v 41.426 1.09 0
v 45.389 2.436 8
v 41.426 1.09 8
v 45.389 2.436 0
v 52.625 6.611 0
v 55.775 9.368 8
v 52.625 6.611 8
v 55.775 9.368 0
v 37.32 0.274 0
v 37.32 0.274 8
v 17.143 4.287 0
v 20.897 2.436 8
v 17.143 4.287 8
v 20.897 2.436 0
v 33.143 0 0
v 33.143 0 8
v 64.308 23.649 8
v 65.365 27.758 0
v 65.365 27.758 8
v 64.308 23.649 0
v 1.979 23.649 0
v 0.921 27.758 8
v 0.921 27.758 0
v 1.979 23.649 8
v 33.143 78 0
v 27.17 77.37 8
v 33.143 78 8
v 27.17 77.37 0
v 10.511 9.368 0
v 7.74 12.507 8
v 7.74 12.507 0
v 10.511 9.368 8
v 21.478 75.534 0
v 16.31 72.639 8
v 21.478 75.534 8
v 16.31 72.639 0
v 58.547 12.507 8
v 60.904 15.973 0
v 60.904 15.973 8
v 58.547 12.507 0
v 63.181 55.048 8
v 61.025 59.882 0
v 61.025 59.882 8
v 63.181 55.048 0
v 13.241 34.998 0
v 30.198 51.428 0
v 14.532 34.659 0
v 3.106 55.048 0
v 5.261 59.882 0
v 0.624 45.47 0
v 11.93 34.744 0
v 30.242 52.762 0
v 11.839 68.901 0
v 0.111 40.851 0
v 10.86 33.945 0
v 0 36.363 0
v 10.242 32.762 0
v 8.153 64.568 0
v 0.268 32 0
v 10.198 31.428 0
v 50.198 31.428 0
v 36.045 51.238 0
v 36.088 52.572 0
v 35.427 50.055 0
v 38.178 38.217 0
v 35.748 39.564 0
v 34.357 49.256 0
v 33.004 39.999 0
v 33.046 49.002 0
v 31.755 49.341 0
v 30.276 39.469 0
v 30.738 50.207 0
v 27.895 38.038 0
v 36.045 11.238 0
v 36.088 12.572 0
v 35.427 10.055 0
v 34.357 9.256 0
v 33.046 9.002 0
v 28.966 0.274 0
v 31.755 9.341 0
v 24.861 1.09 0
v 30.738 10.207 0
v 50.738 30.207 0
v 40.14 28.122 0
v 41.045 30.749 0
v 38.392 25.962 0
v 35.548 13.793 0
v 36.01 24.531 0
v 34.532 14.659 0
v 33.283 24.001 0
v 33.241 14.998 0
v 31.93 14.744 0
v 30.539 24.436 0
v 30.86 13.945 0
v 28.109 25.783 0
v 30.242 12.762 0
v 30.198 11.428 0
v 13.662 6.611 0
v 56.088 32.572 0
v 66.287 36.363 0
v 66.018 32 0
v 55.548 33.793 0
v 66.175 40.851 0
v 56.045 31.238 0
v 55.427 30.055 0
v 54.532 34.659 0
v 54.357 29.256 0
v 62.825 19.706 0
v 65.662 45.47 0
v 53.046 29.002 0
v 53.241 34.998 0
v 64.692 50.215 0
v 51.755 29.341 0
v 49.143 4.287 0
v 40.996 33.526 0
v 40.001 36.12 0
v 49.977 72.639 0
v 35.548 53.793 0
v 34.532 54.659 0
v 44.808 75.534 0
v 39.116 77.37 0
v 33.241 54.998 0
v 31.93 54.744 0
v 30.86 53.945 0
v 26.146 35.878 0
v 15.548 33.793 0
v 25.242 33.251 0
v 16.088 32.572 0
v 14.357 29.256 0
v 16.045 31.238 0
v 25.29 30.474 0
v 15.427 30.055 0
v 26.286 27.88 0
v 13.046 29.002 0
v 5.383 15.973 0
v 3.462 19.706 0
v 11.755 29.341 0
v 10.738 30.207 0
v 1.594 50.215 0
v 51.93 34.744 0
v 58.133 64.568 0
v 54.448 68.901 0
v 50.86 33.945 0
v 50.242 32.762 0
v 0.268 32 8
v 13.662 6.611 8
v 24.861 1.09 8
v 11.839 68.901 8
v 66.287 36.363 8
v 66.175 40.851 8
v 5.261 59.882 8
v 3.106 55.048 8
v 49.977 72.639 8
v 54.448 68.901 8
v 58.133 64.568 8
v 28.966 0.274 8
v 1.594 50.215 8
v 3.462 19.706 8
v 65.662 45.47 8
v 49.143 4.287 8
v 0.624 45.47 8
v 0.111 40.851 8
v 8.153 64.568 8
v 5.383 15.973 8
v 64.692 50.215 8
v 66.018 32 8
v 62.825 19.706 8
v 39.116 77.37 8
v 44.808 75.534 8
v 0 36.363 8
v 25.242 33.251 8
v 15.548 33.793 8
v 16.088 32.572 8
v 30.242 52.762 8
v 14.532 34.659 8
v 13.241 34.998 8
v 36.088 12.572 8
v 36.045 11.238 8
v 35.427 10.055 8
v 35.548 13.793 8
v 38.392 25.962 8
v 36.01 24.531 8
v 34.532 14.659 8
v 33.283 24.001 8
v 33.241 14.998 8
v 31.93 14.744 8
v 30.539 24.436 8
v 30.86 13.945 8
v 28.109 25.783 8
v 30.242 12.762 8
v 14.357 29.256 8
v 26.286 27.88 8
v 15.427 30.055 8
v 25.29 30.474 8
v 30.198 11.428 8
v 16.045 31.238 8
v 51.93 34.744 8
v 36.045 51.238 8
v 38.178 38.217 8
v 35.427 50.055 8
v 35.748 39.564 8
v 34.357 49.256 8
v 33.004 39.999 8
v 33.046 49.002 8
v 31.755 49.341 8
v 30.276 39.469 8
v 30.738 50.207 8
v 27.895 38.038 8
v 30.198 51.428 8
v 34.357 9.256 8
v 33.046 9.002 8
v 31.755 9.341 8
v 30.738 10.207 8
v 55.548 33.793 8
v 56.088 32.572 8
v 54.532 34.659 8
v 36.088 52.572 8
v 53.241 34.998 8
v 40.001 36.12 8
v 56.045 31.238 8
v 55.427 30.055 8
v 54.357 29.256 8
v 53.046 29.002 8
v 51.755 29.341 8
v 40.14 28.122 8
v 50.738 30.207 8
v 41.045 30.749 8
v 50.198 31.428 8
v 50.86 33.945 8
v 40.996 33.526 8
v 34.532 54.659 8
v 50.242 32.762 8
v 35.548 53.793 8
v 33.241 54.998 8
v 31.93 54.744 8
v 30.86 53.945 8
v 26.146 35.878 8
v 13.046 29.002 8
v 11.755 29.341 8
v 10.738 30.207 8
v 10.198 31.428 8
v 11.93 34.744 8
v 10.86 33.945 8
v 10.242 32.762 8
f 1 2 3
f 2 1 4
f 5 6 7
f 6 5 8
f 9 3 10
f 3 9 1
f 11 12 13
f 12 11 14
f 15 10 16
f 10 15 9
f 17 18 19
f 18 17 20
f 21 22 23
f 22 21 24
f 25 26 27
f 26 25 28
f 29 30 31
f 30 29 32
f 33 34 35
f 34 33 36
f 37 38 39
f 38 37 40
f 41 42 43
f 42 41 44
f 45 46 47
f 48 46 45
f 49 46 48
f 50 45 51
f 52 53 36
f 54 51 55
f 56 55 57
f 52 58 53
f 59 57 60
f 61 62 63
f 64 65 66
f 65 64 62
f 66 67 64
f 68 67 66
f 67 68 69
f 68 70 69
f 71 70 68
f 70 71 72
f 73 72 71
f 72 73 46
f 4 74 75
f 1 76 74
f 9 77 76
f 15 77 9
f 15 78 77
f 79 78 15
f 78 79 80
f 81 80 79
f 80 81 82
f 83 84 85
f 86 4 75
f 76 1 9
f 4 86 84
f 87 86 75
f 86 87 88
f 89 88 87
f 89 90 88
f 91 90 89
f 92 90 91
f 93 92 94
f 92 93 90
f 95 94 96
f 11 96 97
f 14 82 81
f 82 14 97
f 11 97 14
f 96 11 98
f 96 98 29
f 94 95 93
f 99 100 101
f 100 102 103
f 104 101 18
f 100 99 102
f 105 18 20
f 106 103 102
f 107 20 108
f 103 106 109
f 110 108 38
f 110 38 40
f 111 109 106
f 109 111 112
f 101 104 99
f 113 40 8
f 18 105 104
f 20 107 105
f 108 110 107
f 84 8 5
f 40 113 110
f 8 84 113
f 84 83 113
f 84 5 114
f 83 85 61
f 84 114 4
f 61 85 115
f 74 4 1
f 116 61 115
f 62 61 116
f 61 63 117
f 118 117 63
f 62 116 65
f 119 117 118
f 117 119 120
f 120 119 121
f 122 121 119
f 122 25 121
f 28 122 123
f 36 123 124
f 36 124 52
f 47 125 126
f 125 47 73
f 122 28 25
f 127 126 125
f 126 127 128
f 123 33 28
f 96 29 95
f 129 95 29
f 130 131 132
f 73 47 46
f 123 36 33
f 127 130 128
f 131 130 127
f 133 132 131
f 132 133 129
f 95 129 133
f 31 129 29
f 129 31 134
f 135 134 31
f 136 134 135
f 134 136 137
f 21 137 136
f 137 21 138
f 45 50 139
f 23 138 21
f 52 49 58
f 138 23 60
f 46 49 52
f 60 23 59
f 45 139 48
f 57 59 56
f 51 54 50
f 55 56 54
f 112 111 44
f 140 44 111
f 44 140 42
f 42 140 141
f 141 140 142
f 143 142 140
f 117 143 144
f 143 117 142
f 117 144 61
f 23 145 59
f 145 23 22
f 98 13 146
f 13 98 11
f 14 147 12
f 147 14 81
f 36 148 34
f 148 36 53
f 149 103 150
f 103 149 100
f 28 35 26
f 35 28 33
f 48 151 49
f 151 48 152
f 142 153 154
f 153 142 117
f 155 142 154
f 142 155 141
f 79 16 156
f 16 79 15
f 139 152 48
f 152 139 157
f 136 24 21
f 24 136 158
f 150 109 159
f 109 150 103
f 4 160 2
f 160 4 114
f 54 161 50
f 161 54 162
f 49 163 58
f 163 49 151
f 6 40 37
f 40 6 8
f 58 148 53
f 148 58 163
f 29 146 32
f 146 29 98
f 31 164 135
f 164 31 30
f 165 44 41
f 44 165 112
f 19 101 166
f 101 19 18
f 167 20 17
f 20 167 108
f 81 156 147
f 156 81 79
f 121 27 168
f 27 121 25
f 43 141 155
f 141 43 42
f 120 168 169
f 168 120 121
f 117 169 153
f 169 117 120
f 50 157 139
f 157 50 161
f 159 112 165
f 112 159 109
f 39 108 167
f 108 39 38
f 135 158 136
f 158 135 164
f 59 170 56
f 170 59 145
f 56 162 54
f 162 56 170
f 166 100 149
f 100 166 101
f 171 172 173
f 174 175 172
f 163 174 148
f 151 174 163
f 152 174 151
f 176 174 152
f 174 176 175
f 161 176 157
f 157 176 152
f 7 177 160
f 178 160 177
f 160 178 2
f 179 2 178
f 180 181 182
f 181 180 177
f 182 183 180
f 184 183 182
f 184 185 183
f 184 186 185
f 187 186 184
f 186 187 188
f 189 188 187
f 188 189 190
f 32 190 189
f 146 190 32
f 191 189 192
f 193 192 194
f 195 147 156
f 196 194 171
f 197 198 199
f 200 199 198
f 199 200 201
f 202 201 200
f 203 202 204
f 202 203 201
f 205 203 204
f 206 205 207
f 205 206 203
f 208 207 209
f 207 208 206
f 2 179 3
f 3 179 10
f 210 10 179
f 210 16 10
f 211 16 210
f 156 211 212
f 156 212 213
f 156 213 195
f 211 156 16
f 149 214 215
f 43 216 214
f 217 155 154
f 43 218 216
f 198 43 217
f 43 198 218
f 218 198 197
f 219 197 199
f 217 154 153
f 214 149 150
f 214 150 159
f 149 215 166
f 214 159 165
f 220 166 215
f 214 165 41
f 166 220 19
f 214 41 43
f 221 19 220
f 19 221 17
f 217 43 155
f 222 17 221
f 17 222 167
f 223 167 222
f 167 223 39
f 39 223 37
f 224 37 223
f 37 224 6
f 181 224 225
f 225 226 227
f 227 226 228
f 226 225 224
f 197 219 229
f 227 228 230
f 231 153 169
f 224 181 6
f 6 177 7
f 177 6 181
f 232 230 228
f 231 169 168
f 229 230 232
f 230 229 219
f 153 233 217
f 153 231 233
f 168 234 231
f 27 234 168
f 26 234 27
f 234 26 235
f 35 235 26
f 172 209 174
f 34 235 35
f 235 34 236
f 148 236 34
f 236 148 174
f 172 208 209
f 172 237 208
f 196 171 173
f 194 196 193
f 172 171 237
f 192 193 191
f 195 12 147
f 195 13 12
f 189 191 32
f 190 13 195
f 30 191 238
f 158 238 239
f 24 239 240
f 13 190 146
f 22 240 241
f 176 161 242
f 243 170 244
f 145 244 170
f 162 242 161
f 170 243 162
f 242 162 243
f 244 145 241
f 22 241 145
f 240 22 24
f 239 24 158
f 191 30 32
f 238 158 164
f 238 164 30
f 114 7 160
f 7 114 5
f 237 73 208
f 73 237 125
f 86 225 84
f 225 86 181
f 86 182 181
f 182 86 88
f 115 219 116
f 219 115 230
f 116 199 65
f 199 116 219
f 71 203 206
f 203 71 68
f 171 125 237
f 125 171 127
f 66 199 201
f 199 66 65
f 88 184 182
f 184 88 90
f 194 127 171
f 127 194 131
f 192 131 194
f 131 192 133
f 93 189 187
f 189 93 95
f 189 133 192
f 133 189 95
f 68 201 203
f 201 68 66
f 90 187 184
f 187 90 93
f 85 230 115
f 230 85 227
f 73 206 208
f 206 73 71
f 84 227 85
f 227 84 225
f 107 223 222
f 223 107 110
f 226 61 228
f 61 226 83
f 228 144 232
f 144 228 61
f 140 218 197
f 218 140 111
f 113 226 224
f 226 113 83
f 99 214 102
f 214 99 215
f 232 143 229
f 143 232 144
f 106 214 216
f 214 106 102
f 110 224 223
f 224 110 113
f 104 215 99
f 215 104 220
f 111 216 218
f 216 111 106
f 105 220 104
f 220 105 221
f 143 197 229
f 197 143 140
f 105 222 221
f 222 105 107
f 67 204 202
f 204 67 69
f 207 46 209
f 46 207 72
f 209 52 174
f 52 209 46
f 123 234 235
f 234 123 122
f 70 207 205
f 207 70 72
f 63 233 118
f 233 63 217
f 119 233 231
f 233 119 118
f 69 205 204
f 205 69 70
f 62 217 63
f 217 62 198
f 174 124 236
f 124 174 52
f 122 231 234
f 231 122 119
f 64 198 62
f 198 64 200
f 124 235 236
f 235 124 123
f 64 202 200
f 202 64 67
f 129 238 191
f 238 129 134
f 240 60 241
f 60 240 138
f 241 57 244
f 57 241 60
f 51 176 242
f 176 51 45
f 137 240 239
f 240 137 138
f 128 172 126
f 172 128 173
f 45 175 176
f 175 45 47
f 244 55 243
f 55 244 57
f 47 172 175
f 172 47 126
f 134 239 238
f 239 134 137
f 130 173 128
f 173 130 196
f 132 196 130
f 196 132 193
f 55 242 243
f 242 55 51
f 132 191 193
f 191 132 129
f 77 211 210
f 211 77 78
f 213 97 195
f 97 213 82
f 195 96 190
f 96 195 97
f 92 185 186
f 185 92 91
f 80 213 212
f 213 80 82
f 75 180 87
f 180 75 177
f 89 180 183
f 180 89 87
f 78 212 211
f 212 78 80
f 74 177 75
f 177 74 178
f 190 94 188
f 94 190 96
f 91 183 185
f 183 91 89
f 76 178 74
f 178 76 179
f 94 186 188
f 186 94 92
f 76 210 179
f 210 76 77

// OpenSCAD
$fn = 32;

// ----------------------------------------------------------------------
// Cam plate: single_lobe cam, base R32
// ----------------------------------------------------------------------

// --- parameters (mm) ---
base_r = 32;              // base circle radius
lobe_h = 14;              // cam lobe rise
bore_r = 8;               // shaft bore radius
plate_t = 8;              // plate thickness, Z (extrusion height)
ring_r = 20;              // lightening ring radius
bolt_r = 3;               // lightening hole radius

profile = [[66.018, 32], [66.287, 36.363], [66.175, 40.851], [65.662, 45.47], [64.692, 50.215], [63.181, 55.048], [61.025, 59.882], [58.133, 64.568], [54.448, 68.901], [49.977, 72.639], [44.808, 75.534], [39.116, 77.37], [33.143, 78], [27.17, 77.37], [21.478, 75.534], [16.31, 72.639], [11.839, 68.901], [8.153, 64.568], [5.261, 59.882], [3.106, 55.048], [1.594, 50.215], [0.624, 45.47], [0.111, 40.851], [0, 36.363], [0.268, 32], [0.921, 27.758], [1.979, 23.649], [3.462, 19.706], [5.383, 15.973], [7.74, 12.507], [10.511, 9.368], [13.662, 6.611], [17.143, 4.287], [20.897, 2.436], [24.861, 1.09], [28.966, 0.274], [33.143, 0], [37.32, 0.274], [41.426, 1.09], [45.389, 2.436], [49.143, 4.287], [52.625, 6.611], [55.775, 9.368], [58.547, 12.507], [60.904, 15.973], [62.825, 19.706], [64.308, 23.649], [65.365, 27.758]];  // primary outline, 48 points, counter clockwise
void_1 = [[40.996, 33.526], [40.001, 36.12], [38.178, 38.217], [35.748, 39.564], [33.004, 39.999], [30.276, 39.469], [27.895, 38.038], [26.146, 35.878], [25.242, 33.251], [25.29, 30.474], [26.286, 27.88], [28.109, 25.783], [30.539, 24.436], [33.283, 24.001], [36.01, 24.531], [38.392, 25.962], [40.14, 28.122], [41.045, 30.749]];  // shaft bore, 18 points
void_2 = [[56.088, 32.572], [55.548, 33.793], [54.532, 34.659], [53.241, 34.998], [51.93, 34.744], [50.86, 33.945], [50.242, 32.762], [50.198, 31.428], [50.738, 30.207], [51.755, 29.341], [53.046, 29.002], [54.357, 29.256], [55.427, 30.055], [56.045, 31.238]];  // lightening hole 1, 14 points
void_3 = [[36.088, 52.572], [35.548, 53.793], [34.532, 54.659], [33.241, 54.998], [31.93, 54.744], [30.86, 53.945], [30.242, 52.762], [30.198, 51.428], [30.738, 50.207], [31.755, 49.341], [33.046, 49.002], [34.357, 49.256], [35.427, 50.055], [36.045, 51.238]];  // lightening hole 2, 14 points
void_4 = [[16.088, 32.572], [15.548, 33.793], [14.532, 34.659], [13.241, 34.998], [11.93, 34.744], [10.86, 33.945], [10.242, 32.762], [10.198, 31.428], [10.738, 30.207], [11.755, 29.341], [13.046, 29.002], [14.357, 29.256], [15.427, 30.055], [16.045, 31.238]];  // lightening hole 3, 14 points
void_5 = [[36.088, 12.572], [35.548, 13.793], [34.532, 14.659], [33.241, 14.998], [31.93, 14.744], [30.86, 13.945], [30.242, 12.762], [30.198, 11.428], [30.738, 10.207], [31.755, 9.341], [33.046, 9.002], [34.357, 9.256], [35.427, 10.055], [36.045, 11.238]];  // lightening hole 4, 14 points

// --- the one profile operation ---
difference() {
  linear_extrude(height = plate_t) polygon(points = profile);
  translate([0, 0, -1])
    linear_extrude(height = plate_t + 2) polygon(points = void_1);
  translate([0, 0, -1])
    linear_extrude(height = plate_t + 2) polygon(points = void_2);
  translate([0, 0, -1])
    linear_extrude(height = plate_t + 2) polygon(points = void_3);
  translate([0, 0, -1])
    linear_extrude(height = plate_t + 2) polygon(points = void_4);
  translate([0, 0, -1])
    linear_extrude(height = plate_t + 2) polygon(points = void_5);
}
